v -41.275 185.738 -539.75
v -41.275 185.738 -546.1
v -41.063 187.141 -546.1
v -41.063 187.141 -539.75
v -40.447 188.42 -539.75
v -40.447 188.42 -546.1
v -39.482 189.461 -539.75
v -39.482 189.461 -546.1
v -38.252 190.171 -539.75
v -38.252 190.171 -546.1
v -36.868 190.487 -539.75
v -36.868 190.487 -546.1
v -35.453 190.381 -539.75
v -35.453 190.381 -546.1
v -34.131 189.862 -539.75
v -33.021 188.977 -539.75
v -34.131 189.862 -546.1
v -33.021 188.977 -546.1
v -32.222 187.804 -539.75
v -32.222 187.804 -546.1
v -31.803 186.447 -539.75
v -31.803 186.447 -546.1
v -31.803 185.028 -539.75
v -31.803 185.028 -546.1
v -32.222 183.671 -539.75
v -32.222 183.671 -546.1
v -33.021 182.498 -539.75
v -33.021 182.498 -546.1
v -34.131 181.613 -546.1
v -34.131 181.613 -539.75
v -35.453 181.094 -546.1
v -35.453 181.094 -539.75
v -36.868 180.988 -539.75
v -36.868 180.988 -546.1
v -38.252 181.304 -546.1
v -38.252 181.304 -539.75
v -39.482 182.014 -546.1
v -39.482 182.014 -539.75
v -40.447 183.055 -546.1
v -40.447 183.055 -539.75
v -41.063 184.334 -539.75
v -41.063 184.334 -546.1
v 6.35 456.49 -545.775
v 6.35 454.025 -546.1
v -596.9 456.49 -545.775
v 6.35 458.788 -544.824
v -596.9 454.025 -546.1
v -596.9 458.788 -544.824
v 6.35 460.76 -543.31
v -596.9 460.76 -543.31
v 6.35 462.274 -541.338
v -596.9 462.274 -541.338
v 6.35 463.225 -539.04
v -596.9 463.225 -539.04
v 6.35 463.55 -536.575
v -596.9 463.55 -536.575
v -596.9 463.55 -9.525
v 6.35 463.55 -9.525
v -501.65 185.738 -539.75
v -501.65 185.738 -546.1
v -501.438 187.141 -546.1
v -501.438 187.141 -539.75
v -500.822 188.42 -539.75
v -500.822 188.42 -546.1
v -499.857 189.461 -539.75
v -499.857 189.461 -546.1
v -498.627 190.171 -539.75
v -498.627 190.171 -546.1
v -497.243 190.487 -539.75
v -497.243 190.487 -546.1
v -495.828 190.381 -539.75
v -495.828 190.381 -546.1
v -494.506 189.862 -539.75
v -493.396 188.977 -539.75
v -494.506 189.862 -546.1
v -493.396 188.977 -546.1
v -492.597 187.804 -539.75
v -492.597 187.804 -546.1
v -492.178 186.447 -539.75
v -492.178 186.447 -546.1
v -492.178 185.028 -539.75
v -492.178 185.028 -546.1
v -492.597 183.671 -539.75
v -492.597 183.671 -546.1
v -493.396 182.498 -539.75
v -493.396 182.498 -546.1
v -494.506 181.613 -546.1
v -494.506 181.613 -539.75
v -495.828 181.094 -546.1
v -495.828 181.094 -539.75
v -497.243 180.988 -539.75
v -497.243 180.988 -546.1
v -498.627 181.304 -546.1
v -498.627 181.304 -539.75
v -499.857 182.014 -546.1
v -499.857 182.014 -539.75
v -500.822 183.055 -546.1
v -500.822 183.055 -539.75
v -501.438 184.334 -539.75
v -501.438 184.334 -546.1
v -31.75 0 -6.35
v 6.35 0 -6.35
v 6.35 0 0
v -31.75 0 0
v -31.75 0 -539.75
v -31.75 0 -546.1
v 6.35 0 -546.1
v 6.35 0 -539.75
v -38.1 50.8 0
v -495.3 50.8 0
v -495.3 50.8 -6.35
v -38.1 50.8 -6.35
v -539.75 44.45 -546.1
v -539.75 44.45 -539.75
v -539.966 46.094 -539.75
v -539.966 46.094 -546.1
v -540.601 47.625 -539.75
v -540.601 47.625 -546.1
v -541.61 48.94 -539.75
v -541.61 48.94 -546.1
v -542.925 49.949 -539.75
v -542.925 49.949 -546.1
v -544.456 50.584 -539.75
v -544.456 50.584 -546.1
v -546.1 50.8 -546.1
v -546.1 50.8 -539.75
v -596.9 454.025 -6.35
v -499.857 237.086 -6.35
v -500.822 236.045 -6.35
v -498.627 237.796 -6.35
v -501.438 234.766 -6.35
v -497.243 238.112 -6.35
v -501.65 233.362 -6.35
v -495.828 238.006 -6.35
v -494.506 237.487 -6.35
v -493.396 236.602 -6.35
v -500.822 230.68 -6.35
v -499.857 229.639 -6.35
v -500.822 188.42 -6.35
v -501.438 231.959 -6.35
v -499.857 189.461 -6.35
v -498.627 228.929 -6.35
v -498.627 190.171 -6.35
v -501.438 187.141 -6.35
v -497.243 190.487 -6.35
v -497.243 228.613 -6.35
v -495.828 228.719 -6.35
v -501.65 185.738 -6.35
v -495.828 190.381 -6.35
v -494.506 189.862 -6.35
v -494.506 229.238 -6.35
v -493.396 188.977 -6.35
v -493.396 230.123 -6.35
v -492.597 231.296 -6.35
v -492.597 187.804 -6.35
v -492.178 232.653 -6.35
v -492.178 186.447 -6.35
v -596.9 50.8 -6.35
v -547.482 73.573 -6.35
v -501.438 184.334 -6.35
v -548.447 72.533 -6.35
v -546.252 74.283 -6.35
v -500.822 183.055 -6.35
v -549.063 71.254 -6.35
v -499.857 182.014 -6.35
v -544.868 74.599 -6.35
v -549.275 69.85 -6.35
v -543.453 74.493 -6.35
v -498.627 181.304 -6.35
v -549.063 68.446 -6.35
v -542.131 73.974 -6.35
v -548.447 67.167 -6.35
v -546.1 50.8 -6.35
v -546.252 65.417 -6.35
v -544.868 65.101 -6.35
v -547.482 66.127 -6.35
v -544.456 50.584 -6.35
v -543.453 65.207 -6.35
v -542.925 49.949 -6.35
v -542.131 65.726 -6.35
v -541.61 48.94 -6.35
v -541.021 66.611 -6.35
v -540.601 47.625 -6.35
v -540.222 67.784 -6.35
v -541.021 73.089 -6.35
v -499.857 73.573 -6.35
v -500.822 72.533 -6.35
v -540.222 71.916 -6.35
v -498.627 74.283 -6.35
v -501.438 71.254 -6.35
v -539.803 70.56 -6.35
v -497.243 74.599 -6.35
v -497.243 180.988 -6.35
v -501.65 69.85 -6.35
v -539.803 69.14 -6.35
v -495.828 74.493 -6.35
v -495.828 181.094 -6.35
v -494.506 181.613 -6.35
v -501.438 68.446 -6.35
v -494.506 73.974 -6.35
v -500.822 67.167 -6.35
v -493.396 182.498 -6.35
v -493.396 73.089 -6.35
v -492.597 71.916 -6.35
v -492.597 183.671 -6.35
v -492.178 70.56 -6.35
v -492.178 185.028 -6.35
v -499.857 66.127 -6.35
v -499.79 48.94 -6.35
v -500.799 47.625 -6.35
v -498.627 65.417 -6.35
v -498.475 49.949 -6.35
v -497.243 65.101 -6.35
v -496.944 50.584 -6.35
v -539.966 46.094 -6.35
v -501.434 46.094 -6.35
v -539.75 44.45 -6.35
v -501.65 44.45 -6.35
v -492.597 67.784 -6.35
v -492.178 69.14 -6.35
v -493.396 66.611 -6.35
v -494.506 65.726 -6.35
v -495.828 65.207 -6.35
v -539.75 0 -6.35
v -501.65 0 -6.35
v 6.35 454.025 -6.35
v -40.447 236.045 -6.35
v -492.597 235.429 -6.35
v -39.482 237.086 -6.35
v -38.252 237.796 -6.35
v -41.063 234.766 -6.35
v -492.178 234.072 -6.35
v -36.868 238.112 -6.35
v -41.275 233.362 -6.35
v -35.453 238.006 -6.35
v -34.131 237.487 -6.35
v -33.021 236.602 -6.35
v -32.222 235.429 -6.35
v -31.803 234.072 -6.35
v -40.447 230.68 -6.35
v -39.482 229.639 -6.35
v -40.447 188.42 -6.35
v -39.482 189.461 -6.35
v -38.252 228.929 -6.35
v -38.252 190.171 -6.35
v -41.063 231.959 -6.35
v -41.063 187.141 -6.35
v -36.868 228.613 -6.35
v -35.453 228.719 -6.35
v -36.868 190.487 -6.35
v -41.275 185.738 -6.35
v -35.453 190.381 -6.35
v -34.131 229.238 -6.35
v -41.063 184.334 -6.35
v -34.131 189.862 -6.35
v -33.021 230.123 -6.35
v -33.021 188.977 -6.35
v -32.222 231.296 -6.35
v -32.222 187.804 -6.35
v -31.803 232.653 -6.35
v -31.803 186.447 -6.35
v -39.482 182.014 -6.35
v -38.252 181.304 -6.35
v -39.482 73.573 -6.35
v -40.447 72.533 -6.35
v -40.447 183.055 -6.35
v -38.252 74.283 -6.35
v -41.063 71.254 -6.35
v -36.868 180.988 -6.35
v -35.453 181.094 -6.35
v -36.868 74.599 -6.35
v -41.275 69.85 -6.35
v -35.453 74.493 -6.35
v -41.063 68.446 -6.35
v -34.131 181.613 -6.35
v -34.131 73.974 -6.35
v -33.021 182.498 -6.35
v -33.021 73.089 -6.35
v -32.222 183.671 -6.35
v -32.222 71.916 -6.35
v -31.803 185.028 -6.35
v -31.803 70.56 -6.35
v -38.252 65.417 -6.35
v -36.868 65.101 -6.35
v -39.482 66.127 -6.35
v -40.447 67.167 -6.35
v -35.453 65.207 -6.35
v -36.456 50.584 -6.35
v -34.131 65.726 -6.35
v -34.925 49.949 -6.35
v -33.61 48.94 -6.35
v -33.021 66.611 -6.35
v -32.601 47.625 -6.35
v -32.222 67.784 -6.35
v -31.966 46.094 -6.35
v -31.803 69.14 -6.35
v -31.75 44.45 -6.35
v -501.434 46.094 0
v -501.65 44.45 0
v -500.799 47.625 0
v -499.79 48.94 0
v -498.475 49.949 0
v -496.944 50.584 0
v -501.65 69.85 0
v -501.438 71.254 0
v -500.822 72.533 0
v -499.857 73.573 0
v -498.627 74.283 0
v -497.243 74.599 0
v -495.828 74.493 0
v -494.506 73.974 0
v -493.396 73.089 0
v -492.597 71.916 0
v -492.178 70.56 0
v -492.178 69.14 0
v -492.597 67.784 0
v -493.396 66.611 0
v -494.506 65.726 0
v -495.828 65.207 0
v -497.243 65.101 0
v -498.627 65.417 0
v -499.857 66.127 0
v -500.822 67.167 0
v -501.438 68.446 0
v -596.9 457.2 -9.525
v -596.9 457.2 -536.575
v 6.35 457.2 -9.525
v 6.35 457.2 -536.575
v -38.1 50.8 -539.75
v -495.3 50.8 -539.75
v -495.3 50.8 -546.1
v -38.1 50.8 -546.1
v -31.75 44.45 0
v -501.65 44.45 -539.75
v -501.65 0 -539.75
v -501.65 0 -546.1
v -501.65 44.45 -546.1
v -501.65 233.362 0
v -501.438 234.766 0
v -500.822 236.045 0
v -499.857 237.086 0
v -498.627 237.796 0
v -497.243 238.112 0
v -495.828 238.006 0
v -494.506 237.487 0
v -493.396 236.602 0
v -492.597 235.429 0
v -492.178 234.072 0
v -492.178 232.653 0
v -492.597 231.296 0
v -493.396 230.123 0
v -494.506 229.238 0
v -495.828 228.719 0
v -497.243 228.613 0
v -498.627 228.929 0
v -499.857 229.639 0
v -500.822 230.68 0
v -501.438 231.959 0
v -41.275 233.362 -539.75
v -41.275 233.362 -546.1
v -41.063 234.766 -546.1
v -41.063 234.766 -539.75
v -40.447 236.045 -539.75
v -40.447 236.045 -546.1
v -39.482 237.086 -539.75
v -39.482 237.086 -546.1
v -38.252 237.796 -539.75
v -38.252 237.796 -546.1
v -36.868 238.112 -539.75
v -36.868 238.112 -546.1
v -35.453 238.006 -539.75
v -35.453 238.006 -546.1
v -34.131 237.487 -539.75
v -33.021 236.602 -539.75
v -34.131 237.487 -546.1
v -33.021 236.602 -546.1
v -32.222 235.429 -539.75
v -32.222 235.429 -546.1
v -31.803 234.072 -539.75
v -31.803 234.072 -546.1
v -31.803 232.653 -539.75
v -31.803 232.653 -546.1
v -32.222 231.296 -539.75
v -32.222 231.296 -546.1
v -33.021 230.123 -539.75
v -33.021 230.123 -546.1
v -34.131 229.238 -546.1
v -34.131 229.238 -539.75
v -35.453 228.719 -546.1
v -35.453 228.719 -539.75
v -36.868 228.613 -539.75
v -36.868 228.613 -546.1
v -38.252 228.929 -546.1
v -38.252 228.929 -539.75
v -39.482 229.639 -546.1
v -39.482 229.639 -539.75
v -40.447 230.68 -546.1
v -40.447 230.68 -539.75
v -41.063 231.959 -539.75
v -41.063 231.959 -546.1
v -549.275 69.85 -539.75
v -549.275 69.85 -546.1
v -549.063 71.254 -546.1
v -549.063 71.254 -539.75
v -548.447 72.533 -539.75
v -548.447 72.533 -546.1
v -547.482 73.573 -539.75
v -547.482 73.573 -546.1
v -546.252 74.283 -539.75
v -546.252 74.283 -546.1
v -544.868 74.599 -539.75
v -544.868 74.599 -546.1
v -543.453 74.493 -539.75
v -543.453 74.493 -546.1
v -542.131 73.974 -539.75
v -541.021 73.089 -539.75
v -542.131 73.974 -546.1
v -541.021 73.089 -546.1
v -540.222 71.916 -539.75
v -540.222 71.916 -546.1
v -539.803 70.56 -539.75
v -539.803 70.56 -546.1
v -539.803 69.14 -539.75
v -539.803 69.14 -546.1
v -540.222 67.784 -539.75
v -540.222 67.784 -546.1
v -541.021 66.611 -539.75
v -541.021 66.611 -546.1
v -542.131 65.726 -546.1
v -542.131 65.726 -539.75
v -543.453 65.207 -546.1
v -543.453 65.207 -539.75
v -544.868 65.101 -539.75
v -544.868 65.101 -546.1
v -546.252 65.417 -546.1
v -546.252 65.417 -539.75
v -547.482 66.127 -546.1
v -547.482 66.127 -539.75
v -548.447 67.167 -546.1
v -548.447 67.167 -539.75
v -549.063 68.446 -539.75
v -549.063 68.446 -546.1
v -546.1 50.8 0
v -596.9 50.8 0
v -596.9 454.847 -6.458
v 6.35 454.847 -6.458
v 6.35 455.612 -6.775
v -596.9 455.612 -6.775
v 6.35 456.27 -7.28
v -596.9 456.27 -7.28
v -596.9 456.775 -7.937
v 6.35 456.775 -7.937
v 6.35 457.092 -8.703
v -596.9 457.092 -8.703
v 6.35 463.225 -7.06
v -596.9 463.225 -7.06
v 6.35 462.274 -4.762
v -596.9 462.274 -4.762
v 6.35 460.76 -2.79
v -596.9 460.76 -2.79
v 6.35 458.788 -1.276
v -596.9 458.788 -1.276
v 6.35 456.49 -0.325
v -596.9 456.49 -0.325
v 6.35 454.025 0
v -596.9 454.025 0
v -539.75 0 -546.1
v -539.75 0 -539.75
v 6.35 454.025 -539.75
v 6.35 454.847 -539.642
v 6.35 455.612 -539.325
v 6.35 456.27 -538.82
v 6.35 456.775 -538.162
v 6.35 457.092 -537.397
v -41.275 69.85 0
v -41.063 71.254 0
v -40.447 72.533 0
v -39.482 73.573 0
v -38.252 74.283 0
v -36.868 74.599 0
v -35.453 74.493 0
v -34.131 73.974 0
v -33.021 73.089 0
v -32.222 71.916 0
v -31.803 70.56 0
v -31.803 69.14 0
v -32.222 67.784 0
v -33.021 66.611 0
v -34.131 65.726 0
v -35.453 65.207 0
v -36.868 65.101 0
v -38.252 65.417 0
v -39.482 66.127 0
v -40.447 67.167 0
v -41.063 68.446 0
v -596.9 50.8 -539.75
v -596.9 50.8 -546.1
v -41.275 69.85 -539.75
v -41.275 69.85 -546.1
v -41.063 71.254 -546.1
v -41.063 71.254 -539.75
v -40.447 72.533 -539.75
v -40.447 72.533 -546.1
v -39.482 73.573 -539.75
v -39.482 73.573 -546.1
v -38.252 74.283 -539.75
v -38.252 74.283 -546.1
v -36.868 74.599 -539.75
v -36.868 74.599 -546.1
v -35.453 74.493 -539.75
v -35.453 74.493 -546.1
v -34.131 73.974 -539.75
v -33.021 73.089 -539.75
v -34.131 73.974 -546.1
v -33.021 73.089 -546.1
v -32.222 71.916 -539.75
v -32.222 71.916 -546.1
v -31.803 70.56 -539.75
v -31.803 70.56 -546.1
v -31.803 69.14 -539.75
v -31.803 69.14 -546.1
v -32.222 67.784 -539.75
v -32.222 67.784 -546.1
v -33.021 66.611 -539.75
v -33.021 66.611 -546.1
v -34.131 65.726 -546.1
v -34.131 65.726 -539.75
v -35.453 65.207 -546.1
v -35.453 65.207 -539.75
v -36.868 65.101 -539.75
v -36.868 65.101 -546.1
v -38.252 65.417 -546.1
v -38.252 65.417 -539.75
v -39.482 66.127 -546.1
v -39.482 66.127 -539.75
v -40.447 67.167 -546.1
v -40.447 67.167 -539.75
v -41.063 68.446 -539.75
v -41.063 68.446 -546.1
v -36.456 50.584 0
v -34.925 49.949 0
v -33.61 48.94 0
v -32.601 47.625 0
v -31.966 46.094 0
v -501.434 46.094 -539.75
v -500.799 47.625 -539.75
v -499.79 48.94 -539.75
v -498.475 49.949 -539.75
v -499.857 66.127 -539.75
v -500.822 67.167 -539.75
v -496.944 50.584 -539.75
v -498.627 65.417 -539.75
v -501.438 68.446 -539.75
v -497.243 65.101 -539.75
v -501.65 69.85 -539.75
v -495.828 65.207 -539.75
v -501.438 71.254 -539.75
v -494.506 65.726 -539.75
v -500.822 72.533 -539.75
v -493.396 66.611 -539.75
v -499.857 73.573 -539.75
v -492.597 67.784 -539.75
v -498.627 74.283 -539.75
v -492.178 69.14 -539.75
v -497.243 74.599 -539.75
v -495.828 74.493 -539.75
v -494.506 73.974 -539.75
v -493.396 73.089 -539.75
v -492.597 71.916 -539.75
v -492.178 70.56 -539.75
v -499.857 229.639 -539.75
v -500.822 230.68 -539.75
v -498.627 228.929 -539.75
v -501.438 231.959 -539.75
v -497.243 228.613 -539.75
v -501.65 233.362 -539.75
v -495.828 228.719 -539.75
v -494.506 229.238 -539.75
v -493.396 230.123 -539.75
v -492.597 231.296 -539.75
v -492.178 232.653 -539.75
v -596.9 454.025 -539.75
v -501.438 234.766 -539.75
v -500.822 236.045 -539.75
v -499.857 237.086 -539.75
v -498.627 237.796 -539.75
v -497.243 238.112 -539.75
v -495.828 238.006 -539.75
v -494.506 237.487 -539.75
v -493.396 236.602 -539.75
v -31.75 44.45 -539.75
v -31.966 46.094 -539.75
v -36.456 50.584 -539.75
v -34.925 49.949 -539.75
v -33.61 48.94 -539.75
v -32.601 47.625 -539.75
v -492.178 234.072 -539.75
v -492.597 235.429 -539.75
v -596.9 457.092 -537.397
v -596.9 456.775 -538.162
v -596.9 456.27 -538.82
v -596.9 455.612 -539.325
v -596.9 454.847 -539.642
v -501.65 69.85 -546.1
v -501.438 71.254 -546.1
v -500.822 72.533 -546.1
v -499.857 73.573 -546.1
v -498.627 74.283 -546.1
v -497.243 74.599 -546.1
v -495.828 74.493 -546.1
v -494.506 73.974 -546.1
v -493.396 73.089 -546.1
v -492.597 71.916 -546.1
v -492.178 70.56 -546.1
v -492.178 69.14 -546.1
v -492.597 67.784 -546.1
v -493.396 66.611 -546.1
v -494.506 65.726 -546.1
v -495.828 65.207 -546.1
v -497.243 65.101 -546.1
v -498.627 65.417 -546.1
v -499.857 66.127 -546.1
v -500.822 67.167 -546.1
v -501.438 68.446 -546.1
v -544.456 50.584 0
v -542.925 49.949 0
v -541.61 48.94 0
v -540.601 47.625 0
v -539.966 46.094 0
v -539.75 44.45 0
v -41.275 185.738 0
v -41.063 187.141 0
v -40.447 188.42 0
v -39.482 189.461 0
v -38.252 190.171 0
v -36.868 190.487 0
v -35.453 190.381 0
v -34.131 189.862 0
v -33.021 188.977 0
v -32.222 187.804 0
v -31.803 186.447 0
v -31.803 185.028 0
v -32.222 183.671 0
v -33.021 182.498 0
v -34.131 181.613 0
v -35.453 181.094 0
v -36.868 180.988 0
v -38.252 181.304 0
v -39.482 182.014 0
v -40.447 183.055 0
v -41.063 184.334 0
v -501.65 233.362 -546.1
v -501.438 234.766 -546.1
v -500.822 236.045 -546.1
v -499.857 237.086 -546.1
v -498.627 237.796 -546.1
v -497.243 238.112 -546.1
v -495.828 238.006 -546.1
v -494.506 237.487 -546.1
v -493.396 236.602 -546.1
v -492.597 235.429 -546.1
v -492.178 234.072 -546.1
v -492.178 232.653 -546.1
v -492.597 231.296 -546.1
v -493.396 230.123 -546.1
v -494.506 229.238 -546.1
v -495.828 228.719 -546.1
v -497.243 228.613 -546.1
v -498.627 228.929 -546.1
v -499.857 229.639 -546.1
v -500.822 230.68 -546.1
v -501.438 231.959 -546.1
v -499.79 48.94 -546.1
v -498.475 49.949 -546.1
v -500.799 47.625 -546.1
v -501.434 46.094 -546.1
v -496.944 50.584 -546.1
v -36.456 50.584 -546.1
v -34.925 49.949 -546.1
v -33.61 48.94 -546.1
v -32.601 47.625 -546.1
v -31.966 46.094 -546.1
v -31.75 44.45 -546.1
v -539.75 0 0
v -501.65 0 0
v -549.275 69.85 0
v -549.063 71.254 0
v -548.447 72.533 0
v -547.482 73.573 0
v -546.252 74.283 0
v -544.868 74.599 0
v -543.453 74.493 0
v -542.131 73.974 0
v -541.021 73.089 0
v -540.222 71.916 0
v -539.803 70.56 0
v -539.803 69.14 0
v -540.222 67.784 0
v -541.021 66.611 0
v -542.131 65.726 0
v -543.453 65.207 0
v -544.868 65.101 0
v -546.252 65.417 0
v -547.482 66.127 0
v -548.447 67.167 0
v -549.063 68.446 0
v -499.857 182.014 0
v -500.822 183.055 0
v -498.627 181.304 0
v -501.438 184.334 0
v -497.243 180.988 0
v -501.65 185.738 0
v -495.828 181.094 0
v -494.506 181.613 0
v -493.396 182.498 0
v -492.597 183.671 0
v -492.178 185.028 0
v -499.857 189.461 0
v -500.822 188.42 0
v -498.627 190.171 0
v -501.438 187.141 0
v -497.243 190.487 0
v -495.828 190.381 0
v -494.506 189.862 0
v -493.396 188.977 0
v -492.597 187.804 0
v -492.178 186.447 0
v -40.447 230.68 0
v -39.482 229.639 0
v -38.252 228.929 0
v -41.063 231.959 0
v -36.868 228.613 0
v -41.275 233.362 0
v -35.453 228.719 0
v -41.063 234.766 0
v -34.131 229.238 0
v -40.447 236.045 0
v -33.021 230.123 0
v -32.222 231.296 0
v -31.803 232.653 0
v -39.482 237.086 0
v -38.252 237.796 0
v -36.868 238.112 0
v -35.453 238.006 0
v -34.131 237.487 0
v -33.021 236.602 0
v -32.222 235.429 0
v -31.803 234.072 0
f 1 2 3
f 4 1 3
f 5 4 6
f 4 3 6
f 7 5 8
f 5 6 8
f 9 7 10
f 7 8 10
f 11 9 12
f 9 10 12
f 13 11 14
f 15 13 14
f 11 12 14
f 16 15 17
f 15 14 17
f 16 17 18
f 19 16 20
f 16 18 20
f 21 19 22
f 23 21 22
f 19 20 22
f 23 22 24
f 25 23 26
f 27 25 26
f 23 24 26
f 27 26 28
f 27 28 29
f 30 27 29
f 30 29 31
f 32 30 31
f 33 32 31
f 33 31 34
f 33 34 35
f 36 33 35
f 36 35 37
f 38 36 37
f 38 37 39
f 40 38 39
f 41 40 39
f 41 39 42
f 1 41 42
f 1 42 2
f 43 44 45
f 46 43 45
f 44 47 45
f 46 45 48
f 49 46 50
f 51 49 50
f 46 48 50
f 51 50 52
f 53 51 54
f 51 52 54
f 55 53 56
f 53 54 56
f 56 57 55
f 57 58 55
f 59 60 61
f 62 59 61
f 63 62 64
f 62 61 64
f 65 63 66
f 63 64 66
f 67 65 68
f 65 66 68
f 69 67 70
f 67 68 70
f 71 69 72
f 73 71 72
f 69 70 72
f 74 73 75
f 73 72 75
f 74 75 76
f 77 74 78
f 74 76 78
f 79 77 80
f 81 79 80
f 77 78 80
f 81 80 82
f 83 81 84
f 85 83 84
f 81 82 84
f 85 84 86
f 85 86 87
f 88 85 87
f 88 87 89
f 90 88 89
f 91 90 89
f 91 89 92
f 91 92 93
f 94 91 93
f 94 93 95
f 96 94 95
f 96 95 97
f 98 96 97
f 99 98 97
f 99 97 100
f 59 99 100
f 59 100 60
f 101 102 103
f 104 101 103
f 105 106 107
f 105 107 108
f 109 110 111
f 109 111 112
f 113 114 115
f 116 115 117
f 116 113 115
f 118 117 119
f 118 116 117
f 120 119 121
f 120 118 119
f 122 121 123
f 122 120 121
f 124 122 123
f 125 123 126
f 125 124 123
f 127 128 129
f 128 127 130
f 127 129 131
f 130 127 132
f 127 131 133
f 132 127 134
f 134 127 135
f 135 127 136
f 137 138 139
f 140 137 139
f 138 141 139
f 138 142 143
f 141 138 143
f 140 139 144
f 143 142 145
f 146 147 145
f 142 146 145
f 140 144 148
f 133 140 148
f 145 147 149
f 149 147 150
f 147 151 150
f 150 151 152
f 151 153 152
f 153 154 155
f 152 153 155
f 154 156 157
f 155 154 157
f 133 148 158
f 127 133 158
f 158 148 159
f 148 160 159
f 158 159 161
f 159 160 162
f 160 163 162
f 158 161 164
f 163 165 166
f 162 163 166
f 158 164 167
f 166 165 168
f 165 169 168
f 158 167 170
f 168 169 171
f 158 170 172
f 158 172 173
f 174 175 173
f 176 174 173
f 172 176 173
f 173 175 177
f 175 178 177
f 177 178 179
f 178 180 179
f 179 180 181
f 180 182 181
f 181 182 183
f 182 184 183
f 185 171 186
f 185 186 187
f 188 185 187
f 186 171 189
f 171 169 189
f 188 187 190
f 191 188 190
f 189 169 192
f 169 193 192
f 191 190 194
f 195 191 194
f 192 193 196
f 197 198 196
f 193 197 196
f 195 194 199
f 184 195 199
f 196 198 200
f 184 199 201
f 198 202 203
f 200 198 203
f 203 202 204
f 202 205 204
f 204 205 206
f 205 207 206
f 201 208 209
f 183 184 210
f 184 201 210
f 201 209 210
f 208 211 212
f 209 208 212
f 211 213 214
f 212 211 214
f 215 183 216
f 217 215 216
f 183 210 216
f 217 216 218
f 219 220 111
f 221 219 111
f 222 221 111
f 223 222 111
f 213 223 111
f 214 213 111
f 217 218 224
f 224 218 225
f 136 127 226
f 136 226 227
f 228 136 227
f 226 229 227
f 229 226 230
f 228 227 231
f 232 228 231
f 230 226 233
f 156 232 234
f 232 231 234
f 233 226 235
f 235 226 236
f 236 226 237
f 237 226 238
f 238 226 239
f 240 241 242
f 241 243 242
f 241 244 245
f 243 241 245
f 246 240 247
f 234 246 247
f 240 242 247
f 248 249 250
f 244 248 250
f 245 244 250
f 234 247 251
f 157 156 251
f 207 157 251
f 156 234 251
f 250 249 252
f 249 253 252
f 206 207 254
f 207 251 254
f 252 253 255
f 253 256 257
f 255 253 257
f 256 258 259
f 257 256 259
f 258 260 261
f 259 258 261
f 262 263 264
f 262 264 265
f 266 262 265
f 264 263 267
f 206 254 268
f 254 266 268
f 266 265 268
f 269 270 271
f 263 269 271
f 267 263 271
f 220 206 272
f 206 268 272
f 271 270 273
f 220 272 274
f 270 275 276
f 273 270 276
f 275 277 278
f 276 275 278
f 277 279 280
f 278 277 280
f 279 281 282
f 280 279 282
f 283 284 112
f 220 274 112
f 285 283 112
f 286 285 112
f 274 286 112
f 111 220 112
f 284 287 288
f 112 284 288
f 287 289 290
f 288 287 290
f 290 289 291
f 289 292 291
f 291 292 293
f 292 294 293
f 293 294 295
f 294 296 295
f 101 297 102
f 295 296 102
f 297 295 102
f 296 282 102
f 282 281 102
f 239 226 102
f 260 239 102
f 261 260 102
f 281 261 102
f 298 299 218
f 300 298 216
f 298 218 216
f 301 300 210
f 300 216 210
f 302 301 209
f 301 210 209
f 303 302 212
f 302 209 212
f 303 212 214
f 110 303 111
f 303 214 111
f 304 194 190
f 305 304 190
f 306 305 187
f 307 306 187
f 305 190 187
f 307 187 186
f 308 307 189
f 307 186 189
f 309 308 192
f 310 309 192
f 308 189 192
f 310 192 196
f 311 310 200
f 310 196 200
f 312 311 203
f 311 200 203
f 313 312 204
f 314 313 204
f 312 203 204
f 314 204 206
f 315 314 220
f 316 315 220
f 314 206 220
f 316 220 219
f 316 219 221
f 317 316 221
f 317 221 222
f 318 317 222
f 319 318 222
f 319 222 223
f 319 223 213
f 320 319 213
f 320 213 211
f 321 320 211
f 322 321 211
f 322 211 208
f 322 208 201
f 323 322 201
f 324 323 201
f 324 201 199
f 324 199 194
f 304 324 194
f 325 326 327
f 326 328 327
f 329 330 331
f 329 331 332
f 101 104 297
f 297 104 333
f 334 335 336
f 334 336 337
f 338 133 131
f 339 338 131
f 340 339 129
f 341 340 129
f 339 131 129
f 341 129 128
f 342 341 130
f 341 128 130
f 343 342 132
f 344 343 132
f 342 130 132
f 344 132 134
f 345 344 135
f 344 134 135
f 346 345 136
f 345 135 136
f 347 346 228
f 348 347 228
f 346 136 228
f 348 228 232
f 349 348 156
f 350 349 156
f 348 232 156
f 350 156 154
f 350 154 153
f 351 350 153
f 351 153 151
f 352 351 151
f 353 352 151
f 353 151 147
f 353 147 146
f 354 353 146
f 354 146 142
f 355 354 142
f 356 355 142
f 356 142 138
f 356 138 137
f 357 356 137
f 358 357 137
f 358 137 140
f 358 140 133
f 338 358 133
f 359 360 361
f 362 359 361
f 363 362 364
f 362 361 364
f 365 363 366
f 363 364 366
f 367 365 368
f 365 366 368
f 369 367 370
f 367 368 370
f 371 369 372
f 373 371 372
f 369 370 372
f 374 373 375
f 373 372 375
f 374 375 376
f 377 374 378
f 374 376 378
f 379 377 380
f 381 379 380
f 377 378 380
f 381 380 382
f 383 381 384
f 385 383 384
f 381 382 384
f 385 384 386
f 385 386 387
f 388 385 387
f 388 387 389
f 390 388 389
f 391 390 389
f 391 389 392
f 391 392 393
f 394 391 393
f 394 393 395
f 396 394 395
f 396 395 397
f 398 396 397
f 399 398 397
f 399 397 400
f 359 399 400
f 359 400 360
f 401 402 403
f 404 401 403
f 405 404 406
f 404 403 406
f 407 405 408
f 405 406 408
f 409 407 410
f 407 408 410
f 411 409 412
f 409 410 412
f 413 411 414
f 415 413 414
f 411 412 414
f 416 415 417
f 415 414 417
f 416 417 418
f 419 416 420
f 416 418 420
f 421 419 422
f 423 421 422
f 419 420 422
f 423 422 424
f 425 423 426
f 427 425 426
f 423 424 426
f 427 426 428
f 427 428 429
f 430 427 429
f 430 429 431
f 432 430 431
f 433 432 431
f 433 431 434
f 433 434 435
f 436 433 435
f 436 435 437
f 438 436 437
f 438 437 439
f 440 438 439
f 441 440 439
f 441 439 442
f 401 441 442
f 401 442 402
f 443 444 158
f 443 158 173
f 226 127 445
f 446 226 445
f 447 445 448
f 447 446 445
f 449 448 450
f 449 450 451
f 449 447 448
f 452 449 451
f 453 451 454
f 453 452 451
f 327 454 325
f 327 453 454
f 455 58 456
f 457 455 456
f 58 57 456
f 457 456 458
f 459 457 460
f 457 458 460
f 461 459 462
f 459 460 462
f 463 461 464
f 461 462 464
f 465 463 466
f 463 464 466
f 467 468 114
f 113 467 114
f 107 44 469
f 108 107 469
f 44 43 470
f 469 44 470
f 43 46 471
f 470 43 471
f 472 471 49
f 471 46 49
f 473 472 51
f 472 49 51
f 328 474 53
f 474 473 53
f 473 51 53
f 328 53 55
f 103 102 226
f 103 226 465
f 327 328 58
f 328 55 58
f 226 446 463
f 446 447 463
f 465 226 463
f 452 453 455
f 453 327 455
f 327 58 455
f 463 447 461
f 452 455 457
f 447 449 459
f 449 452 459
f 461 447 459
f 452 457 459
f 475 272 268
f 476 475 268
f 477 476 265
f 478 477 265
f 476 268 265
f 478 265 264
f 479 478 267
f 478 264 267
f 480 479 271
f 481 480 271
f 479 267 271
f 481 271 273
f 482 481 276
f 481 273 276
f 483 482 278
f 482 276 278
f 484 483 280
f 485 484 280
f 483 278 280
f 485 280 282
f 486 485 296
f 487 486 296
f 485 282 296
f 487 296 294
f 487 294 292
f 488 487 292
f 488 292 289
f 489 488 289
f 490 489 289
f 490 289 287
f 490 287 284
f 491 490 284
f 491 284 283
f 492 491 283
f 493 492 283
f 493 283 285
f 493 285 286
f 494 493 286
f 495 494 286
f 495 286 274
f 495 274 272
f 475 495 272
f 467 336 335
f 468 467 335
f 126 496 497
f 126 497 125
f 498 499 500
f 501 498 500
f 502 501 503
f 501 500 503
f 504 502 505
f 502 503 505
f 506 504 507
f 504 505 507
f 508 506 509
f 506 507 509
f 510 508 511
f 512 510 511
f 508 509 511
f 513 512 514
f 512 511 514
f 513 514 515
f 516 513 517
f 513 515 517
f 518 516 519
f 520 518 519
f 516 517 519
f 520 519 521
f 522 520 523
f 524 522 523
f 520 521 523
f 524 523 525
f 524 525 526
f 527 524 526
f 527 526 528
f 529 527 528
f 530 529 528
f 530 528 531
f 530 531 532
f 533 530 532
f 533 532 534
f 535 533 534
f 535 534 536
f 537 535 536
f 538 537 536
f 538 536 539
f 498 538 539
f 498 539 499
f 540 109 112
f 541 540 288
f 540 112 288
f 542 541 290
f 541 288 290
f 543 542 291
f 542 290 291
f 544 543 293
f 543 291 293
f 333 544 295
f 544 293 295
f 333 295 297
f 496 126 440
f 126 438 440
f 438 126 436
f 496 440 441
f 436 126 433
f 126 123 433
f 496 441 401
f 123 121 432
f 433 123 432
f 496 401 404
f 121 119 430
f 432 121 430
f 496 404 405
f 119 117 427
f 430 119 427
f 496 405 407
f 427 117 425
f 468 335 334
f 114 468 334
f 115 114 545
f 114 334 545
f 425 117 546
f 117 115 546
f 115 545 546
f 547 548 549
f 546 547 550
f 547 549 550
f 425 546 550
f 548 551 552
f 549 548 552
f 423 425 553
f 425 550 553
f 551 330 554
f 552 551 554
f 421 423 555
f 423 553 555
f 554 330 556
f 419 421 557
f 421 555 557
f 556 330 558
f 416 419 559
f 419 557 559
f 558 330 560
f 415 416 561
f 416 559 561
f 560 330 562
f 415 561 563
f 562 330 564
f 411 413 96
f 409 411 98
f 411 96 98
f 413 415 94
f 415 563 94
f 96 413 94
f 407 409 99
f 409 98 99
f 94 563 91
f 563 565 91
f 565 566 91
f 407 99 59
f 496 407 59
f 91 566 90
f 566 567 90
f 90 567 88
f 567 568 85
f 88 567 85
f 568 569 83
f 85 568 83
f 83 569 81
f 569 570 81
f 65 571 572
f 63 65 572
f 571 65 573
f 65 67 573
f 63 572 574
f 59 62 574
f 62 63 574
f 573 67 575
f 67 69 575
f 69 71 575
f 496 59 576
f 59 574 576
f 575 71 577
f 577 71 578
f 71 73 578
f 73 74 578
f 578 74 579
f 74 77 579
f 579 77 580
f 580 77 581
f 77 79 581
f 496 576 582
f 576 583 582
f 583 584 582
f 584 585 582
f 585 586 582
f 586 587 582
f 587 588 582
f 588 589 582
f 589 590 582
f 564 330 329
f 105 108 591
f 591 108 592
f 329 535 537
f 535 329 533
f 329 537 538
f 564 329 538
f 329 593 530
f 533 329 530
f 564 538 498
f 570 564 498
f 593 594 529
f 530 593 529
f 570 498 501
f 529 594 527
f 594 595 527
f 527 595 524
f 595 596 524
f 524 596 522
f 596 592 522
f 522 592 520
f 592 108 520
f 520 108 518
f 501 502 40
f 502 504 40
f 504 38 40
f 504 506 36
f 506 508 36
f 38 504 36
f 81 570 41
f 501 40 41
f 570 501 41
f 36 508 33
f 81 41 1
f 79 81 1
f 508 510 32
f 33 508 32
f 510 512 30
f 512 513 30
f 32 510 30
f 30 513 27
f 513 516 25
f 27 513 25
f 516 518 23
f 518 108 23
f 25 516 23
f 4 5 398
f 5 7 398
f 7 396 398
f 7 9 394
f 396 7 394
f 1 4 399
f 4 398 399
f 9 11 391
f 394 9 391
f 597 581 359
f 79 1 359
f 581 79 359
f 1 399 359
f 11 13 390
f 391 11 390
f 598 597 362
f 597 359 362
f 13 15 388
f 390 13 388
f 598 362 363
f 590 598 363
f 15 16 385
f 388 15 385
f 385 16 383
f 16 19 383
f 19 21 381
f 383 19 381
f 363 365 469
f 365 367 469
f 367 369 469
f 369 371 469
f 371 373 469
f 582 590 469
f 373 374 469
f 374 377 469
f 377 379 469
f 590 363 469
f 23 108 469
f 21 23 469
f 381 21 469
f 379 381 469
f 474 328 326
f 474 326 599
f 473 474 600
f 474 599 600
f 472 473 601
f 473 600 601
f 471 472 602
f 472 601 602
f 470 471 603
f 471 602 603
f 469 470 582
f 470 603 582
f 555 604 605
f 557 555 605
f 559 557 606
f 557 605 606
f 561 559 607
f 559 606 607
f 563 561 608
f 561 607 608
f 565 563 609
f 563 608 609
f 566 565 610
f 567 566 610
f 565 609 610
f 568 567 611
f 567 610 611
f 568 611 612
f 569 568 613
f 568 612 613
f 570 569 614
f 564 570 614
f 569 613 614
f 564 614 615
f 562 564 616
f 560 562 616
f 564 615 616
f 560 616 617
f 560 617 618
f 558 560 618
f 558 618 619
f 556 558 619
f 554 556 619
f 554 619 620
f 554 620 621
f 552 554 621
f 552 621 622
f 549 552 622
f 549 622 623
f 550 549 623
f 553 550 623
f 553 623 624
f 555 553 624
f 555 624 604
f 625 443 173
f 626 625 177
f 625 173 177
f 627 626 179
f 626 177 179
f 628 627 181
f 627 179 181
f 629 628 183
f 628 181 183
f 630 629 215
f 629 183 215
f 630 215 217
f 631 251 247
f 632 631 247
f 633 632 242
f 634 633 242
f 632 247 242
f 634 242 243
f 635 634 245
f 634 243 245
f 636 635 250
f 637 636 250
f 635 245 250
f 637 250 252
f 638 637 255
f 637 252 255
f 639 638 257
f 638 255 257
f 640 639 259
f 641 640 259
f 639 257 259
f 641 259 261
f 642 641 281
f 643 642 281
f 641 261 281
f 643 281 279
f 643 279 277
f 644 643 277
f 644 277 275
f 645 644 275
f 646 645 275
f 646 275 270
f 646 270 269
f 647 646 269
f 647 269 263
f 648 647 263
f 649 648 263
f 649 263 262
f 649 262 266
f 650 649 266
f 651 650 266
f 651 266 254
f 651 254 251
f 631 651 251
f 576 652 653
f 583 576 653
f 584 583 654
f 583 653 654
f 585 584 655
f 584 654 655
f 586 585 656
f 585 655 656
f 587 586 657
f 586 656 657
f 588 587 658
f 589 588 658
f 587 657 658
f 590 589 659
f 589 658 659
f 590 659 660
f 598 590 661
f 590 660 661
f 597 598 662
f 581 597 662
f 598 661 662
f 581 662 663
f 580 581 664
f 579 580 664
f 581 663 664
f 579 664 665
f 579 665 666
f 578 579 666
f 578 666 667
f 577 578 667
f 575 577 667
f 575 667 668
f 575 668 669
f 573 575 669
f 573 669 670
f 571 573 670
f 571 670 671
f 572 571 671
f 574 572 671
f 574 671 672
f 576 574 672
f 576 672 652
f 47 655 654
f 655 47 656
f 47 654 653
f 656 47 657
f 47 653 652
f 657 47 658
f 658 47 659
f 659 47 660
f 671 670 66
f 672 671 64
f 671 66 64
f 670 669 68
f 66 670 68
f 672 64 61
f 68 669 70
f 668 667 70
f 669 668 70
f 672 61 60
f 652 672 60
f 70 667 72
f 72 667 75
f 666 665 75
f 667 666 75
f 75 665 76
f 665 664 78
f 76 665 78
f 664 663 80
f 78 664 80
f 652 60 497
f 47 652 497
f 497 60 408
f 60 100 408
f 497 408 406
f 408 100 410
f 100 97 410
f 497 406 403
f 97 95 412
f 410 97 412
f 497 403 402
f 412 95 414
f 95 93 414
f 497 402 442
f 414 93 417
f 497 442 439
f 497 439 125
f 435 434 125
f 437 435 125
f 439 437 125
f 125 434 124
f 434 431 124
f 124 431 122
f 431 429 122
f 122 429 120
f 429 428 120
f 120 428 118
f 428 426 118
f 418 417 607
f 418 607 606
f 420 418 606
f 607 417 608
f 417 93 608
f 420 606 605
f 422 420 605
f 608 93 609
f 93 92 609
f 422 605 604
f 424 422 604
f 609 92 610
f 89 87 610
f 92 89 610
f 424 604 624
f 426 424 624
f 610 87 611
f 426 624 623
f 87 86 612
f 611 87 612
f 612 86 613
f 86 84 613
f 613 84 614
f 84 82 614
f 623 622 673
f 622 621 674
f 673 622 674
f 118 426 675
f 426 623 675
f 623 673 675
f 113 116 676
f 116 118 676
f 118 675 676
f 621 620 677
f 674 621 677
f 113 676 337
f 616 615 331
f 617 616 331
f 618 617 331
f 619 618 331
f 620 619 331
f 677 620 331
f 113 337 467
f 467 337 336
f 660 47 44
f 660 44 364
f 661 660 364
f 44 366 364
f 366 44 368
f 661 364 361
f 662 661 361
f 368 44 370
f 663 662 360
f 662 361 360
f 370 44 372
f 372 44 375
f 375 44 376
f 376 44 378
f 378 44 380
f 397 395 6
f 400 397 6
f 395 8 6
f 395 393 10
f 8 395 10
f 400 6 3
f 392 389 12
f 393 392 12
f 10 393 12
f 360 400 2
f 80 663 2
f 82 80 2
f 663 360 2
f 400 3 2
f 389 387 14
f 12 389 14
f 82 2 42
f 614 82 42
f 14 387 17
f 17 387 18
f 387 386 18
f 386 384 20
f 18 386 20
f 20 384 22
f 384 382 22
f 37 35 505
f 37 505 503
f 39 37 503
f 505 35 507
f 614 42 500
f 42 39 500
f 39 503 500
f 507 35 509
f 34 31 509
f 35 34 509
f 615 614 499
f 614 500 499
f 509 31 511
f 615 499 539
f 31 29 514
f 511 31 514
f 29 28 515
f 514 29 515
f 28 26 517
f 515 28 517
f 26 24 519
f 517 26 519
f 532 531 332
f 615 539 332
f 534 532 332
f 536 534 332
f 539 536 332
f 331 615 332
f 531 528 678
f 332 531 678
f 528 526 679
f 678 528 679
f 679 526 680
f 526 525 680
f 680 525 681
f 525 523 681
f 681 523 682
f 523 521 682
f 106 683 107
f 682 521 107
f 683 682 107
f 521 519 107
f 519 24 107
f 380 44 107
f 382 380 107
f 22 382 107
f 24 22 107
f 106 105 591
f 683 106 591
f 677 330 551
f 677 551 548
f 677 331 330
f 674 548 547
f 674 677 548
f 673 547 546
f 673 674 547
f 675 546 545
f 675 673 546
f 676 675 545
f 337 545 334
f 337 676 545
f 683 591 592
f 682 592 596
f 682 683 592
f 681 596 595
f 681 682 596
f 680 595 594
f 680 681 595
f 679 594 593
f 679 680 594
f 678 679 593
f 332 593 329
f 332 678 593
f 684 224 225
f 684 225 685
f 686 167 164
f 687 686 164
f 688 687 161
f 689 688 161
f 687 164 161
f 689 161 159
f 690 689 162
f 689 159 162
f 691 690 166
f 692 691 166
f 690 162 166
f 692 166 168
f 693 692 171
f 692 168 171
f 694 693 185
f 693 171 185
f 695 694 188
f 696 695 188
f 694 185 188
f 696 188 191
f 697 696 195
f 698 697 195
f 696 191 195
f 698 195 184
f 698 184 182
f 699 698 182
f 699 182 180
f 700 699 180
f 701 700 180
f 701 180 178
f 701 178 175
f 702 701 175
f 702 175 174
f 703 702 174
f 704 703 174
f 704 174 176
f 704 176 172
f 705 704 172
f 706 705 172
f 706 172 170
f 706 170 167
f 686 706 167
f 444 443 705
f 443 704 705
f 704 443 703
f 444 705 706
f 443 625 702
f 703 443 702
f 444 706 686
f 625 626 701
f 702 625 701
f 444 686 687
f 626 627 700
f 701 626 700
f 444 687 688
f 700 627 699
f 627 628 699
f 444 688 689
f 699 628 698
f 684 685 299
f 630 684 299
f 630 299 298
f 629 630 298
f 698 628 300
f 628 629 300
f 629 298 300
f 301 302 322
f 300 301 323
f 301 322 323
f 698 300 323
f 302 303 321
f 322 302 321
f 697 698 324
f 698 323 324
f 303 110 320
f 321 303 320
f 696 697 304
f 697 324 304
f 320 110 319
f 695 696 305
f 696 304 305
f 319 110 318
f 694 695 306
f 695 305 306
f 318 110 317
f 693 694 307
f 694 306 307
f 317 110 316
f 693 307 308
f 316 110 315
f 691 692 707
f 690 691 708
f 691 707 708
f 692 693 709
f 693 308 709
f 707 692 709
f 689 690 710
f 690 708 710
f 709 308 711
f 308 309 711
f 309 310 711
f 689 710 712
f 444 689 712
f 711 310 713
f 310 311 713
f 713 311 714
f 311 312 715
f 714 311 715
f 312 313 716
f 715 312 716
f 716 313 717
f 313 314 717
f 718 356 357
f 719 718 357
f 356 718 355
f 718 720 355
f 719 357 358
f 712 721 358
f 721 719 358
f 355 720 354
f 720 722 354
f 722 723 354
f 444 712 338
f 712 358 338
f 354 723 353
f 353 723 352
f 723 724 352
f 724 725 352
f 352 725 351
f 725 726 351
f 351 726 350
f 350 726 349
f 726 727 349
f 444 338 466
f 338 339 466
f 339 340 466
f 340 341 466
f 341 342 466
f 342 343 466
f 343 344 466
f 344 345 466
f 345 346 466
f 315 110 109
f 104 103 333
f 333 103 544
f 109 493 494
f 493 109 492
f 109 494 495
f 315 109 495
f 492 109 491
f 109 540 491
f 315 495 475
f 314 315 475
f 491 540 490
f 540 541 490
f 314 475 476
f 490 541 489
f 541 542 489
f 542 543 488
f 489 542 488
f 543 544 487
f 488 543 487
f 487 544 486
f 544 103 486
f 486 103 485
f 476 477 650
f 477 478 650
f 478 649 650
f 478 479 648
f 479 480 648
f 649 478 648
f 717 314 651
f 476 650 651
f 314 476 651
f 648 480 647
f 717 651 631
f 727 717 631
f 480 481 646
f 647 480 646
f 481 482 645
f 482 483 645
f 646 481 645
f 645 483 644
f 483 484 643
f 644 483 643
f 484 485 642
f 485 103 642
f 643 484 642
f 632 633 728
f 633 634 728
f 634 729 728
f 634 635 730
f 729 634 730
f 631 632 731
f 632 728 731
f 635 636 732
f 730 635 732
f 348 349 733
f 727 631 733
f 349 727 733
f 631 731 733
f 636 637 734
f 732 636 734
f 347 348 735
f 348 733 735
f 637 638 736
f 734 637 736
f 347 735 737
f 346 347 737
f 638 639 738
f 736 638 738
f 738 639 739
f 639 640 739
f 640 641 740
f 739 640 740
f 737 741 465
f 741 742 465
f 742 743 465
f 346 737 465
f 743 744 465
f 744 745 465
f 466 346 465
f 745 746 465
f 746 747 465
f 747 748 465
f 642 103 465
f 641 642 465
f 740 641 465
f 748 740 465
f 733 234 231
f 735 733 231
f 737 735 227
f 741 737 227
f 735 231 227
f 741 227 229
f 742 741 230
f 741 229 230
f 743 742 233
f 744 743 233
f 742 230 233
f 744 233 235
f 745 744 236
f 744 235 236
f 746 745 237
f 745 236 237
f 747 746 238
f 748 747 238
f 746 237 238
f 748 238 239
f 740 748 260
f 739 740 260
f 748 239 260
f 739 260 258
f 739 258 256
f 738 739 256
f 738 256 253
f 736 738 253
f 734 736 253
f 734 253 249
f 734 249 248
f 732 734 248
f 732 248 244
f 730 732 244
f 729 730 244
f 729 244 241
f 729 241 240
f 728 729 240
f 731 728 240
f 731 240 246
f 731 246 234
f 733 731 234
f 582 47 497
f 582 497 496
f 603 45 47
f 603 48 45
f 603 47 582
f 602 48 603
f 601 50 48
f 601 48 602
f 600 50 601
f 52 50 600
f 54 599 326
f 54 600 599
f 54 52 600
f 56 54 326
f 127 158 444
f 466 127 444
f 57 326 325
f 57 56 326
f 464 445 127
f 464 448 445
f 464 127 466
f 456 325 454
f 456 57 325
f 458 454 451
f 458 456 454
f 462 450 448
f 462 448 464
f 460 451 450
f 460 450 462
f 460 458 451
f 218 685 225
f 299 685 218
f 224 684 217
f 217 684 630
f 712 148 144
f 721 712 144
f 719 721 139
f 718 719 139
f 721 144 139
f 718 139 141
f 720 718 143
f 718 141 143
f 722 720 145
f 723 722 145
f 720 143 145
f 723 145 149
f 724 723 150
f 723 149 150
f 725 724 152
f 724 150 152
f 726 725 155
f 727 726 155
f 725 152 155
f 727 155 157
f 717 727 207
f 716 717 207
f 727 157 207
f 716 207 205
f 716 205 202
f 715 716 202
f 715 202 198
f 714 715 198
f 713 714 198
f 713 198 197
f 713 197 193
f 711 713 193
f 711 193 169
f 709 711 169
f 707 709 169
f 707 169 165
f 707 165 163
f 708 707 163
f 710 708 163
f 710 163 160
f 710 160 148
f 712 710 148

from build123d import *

# Parameters (mm, degrees)
BOSS_EXTRUDE1_DEPTH          = 6.35
BOSS_EXTRUDE1_DEPTH_BACK     = 596.9
FILLET1_R                    = 3.175
FILLET2_R                    = 9.525
SKETCH2_W                    = 469.9
SKETCH2_H                    = 50.8
SKETCH2_W_2                  = 57.15
CUT_EXTRUDE1_DEPTH           = 547.1
FILLET3_R                    = 6.35
F_3_8_0_375_DIAMETER_HOLE1_D = 9.525


with BuildPart() as part:
    # Sketch1 → Boss-Extrude1 (new body, two sides)
    with BuildSketch(Plane(origin=(0, 0, 0), x_dir=(0, 0, -1), z_dir=(1, 0, 0))) as boss_extrude1_sk:
        Polygon((0, 0), (0, 463.55), (546.1, 463.55), (546.1, 0), (539.75, 0), (539.75, 457.2), (6.35, 457.2), (6.35, 0), align=None)
    extrude(amount=BOSS_EXTRUDE1_DEPTH)
    extrude(boss_extrude1_sk.sketch, amount=-BOSS_EXTRUDE1_DEPTH_BACK)

    # Fillet1
    fillet1_edges = [part.edges().sort_by_distance(p)[0] for p in [
        (-295.275, 457.2, -539.75),
        (-295.275, 457.2, -6.35),
    ]]
    fillet(fillet1_edges, radius=FILLET1_R)

    # Fillet2
    fillet2_edges = [part.edges().sort_by_distance(p)[0] for p in [
        (-295.275, 463.55, 0),
        (-295.275, 463.55, -546.1),
    ]]
    fillet(fillet2_edges, radius=FILLET2_R)

    # Sketch2 → Cut-Extrude1 (cut, through all)
    with BuildSketch(Plane.XY):
        with Locations((-266.7, 25.4)):
            Rectangle(SKETCH2_W, SKETCH2_H)
        with Locations((-568.325, 25.4)):
            Rectangle(SKETCH2_W_2, SKETCH2_H)
    extrude(amount=-CUT_EXTRUDE1_DEPTH, mode=Mode.SUBTRACT)

    # Fillet3
    fillet3_edges = [part.edges().sort_by_distance(p)[0] for p in [
        (-31.75, 50.8, -542.925),
        (-501.65, 50.8, -542.925),
        (-31.75, 50.8, -3.175),
        (-501.65, 50.8, -3.175),
        (-539.75, 50.8, -542.925),
        (-539.75, 50.8, -3.175),
    ]]
    fillet(fillet3_edges, radius=FILLET3_R)

    # 3/8 (0.375) Diameter Hole1 (through all)
    with Locations(Plane.XY):
        with Locations((-36.5125, 69.85), (-36.5125, 185.7375), (-36.5125, 233.3625), (-496.8875, 69.85), (-496.8875, 185.7375), (-496.8875, 233.3625), (-544.5125, 69.85)):
            Hole(F_3_8_0_375_DIAMETER_HOLE1_D / 2)


solid = part.part
